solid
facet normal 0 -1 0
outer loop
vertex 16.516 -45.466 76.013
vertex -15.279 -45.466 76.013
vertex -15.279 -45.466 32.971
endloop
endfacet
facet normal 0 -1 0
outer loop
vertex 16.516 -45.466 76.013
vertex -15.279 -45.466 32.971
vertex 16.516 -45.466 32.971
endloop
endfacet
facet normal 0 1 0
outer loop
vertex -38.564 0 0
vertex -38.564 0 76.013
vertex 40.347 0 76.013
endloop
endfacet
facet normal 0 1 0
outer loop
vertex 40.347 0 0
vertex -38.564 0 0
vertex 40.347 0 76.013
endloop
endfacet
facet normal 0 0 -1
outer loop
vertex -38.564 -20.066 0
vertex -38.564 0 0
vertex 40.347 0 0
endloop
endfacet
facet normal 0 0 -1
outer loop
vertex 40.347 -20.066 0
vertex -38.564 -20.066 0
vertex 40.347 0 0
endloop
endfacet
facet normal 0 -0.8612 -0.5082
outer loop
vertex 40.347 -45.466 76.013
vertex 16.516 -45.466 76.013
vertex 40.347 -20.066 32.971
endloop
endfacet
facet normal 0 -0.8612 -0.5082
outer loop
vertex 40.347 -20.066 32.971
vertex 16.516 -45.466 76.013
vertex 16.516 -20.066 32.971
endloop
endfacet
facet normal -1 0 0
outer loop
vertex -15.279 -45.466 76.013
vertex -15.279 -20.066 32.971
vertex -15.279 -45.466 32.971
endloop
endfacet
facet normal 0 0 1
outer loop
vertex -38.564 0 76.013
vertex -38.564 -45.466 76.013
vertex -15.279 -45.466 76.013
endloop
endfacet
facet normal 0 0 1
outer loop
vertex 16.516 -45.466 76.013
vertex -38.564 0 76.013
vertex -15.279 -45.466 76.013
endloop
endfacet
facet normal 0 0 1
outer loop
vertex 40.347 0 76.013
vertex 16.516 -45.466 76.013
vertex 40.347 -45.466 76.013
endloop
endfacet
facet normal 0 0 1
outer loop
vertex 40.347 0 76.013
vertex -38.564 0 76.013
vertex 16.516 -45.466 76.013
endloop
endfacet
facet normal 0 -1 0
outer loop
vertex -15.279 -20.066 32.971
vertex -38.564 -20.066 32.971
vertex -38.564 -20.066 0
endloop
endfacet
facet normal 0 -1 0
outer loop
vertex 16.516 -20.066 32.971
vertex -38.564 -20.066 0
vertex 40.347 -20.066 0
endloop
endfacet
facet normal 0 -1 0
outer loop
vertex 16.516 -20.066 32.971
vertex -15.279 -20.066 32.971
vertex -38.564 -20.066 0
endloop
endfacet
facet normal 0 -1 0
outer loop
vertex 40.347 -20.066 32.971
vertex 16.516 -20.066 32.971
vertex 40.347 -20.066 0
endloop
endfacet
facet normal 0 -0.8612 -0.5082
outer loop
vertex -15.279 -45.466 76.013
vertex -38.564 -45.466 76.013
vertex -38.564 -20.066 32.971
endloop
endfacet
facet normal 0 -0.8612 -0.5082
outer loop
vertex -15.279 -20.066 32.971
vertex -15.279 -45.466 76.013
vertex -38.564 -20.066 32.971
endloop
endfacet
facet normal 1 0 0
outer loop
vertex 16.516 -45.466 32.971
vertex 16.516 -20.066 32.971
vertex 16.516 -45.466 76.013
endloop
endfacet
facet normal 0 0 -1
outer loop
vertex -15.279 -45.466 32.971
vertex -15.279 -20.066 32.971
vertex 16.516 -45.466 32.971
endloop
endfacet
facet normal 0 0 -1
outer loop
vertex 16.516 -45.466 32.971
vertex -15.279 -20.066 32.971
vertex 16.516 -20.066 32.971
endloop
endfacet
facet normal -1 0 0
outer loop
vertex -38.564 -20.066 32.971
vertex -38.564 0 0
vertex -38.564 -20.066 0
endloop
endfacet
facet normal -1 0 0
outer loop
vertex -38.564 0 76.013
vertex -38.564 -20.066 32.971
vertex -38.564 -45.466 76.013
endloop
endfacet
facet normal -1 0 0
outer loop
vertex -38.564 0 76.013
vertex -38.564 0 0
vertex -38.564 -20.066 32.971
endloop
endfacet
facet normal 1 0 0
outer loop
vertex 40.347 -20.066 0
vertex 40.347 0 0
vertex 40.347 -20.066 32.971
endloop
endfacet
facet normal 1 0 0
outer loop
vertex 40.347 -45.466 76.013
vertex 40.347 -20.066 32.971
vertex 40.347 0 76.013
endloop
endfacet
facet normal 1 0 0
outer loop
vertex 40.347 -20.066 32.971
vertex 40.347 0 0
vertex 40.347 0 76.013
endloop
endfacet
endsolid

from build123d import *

# Parameters (mm, degrees)
F1_DEPTH = 20.066
F0_W     = 23.2850266621
F0_H     = 43.0419966578
F0_W_2   = 23.8309800625
F2_DEPTH = 45.466
F4_DEPTH = 78.9115072618
F0_W_3   = 31.7945005372
F5_DEPTH = 45.466


with BuildPart() as f1:
    # F0 (on Front) → F1 (new body)
    with BuildSketch(Plane.XZ):
        Polygon((-38.5636128485, 32.9706594348), (-38.5636128485, 0), (40.3468944132, 0), (40.3468944132, 32.9706594348), (16.5159143507, 32.9706594348), (-15.2785861865, 32.9706594348), align=None)
    extrude(amount=F1_DEPTH)

    # F0 (on Front) → F2 (join)
    with BuildSketch(Plane.XZ):
        with Locations((-26.9210995175, 54.4916577637)):
            Rectangle(F0_W, F0_H)
        with Locations((28.431404382, 54.4916577637)):
            Rectangle(F0_W_2, F0_H)
    extrude(amount=F2_DEPTH)

    # F3 (on face) → F4 (cut, through all)
    with BuildSketch(Plane(origin=(-38.5636128485, 0, 0), x_dir=(0, -1, 0), z_dir=(-1, 0, 0))):
        Polygon((45.466, 32.9706594348), (45.466, 76.0126560926), (20.066, 32.9706594348), align=None)
    extrude(amount=-F4_DEPTH, mode=Mode.SUBTRACT)

    # F0 (on Front) → F5 (join)
    with BuildSketch(Plane.XZ):
        with Locations((0.6186640821, 54.4916577637)):
            Rectangle(F0_W_3, F0_H)
    extrude(amount=F5_DEPTH)


solid = f1.part
